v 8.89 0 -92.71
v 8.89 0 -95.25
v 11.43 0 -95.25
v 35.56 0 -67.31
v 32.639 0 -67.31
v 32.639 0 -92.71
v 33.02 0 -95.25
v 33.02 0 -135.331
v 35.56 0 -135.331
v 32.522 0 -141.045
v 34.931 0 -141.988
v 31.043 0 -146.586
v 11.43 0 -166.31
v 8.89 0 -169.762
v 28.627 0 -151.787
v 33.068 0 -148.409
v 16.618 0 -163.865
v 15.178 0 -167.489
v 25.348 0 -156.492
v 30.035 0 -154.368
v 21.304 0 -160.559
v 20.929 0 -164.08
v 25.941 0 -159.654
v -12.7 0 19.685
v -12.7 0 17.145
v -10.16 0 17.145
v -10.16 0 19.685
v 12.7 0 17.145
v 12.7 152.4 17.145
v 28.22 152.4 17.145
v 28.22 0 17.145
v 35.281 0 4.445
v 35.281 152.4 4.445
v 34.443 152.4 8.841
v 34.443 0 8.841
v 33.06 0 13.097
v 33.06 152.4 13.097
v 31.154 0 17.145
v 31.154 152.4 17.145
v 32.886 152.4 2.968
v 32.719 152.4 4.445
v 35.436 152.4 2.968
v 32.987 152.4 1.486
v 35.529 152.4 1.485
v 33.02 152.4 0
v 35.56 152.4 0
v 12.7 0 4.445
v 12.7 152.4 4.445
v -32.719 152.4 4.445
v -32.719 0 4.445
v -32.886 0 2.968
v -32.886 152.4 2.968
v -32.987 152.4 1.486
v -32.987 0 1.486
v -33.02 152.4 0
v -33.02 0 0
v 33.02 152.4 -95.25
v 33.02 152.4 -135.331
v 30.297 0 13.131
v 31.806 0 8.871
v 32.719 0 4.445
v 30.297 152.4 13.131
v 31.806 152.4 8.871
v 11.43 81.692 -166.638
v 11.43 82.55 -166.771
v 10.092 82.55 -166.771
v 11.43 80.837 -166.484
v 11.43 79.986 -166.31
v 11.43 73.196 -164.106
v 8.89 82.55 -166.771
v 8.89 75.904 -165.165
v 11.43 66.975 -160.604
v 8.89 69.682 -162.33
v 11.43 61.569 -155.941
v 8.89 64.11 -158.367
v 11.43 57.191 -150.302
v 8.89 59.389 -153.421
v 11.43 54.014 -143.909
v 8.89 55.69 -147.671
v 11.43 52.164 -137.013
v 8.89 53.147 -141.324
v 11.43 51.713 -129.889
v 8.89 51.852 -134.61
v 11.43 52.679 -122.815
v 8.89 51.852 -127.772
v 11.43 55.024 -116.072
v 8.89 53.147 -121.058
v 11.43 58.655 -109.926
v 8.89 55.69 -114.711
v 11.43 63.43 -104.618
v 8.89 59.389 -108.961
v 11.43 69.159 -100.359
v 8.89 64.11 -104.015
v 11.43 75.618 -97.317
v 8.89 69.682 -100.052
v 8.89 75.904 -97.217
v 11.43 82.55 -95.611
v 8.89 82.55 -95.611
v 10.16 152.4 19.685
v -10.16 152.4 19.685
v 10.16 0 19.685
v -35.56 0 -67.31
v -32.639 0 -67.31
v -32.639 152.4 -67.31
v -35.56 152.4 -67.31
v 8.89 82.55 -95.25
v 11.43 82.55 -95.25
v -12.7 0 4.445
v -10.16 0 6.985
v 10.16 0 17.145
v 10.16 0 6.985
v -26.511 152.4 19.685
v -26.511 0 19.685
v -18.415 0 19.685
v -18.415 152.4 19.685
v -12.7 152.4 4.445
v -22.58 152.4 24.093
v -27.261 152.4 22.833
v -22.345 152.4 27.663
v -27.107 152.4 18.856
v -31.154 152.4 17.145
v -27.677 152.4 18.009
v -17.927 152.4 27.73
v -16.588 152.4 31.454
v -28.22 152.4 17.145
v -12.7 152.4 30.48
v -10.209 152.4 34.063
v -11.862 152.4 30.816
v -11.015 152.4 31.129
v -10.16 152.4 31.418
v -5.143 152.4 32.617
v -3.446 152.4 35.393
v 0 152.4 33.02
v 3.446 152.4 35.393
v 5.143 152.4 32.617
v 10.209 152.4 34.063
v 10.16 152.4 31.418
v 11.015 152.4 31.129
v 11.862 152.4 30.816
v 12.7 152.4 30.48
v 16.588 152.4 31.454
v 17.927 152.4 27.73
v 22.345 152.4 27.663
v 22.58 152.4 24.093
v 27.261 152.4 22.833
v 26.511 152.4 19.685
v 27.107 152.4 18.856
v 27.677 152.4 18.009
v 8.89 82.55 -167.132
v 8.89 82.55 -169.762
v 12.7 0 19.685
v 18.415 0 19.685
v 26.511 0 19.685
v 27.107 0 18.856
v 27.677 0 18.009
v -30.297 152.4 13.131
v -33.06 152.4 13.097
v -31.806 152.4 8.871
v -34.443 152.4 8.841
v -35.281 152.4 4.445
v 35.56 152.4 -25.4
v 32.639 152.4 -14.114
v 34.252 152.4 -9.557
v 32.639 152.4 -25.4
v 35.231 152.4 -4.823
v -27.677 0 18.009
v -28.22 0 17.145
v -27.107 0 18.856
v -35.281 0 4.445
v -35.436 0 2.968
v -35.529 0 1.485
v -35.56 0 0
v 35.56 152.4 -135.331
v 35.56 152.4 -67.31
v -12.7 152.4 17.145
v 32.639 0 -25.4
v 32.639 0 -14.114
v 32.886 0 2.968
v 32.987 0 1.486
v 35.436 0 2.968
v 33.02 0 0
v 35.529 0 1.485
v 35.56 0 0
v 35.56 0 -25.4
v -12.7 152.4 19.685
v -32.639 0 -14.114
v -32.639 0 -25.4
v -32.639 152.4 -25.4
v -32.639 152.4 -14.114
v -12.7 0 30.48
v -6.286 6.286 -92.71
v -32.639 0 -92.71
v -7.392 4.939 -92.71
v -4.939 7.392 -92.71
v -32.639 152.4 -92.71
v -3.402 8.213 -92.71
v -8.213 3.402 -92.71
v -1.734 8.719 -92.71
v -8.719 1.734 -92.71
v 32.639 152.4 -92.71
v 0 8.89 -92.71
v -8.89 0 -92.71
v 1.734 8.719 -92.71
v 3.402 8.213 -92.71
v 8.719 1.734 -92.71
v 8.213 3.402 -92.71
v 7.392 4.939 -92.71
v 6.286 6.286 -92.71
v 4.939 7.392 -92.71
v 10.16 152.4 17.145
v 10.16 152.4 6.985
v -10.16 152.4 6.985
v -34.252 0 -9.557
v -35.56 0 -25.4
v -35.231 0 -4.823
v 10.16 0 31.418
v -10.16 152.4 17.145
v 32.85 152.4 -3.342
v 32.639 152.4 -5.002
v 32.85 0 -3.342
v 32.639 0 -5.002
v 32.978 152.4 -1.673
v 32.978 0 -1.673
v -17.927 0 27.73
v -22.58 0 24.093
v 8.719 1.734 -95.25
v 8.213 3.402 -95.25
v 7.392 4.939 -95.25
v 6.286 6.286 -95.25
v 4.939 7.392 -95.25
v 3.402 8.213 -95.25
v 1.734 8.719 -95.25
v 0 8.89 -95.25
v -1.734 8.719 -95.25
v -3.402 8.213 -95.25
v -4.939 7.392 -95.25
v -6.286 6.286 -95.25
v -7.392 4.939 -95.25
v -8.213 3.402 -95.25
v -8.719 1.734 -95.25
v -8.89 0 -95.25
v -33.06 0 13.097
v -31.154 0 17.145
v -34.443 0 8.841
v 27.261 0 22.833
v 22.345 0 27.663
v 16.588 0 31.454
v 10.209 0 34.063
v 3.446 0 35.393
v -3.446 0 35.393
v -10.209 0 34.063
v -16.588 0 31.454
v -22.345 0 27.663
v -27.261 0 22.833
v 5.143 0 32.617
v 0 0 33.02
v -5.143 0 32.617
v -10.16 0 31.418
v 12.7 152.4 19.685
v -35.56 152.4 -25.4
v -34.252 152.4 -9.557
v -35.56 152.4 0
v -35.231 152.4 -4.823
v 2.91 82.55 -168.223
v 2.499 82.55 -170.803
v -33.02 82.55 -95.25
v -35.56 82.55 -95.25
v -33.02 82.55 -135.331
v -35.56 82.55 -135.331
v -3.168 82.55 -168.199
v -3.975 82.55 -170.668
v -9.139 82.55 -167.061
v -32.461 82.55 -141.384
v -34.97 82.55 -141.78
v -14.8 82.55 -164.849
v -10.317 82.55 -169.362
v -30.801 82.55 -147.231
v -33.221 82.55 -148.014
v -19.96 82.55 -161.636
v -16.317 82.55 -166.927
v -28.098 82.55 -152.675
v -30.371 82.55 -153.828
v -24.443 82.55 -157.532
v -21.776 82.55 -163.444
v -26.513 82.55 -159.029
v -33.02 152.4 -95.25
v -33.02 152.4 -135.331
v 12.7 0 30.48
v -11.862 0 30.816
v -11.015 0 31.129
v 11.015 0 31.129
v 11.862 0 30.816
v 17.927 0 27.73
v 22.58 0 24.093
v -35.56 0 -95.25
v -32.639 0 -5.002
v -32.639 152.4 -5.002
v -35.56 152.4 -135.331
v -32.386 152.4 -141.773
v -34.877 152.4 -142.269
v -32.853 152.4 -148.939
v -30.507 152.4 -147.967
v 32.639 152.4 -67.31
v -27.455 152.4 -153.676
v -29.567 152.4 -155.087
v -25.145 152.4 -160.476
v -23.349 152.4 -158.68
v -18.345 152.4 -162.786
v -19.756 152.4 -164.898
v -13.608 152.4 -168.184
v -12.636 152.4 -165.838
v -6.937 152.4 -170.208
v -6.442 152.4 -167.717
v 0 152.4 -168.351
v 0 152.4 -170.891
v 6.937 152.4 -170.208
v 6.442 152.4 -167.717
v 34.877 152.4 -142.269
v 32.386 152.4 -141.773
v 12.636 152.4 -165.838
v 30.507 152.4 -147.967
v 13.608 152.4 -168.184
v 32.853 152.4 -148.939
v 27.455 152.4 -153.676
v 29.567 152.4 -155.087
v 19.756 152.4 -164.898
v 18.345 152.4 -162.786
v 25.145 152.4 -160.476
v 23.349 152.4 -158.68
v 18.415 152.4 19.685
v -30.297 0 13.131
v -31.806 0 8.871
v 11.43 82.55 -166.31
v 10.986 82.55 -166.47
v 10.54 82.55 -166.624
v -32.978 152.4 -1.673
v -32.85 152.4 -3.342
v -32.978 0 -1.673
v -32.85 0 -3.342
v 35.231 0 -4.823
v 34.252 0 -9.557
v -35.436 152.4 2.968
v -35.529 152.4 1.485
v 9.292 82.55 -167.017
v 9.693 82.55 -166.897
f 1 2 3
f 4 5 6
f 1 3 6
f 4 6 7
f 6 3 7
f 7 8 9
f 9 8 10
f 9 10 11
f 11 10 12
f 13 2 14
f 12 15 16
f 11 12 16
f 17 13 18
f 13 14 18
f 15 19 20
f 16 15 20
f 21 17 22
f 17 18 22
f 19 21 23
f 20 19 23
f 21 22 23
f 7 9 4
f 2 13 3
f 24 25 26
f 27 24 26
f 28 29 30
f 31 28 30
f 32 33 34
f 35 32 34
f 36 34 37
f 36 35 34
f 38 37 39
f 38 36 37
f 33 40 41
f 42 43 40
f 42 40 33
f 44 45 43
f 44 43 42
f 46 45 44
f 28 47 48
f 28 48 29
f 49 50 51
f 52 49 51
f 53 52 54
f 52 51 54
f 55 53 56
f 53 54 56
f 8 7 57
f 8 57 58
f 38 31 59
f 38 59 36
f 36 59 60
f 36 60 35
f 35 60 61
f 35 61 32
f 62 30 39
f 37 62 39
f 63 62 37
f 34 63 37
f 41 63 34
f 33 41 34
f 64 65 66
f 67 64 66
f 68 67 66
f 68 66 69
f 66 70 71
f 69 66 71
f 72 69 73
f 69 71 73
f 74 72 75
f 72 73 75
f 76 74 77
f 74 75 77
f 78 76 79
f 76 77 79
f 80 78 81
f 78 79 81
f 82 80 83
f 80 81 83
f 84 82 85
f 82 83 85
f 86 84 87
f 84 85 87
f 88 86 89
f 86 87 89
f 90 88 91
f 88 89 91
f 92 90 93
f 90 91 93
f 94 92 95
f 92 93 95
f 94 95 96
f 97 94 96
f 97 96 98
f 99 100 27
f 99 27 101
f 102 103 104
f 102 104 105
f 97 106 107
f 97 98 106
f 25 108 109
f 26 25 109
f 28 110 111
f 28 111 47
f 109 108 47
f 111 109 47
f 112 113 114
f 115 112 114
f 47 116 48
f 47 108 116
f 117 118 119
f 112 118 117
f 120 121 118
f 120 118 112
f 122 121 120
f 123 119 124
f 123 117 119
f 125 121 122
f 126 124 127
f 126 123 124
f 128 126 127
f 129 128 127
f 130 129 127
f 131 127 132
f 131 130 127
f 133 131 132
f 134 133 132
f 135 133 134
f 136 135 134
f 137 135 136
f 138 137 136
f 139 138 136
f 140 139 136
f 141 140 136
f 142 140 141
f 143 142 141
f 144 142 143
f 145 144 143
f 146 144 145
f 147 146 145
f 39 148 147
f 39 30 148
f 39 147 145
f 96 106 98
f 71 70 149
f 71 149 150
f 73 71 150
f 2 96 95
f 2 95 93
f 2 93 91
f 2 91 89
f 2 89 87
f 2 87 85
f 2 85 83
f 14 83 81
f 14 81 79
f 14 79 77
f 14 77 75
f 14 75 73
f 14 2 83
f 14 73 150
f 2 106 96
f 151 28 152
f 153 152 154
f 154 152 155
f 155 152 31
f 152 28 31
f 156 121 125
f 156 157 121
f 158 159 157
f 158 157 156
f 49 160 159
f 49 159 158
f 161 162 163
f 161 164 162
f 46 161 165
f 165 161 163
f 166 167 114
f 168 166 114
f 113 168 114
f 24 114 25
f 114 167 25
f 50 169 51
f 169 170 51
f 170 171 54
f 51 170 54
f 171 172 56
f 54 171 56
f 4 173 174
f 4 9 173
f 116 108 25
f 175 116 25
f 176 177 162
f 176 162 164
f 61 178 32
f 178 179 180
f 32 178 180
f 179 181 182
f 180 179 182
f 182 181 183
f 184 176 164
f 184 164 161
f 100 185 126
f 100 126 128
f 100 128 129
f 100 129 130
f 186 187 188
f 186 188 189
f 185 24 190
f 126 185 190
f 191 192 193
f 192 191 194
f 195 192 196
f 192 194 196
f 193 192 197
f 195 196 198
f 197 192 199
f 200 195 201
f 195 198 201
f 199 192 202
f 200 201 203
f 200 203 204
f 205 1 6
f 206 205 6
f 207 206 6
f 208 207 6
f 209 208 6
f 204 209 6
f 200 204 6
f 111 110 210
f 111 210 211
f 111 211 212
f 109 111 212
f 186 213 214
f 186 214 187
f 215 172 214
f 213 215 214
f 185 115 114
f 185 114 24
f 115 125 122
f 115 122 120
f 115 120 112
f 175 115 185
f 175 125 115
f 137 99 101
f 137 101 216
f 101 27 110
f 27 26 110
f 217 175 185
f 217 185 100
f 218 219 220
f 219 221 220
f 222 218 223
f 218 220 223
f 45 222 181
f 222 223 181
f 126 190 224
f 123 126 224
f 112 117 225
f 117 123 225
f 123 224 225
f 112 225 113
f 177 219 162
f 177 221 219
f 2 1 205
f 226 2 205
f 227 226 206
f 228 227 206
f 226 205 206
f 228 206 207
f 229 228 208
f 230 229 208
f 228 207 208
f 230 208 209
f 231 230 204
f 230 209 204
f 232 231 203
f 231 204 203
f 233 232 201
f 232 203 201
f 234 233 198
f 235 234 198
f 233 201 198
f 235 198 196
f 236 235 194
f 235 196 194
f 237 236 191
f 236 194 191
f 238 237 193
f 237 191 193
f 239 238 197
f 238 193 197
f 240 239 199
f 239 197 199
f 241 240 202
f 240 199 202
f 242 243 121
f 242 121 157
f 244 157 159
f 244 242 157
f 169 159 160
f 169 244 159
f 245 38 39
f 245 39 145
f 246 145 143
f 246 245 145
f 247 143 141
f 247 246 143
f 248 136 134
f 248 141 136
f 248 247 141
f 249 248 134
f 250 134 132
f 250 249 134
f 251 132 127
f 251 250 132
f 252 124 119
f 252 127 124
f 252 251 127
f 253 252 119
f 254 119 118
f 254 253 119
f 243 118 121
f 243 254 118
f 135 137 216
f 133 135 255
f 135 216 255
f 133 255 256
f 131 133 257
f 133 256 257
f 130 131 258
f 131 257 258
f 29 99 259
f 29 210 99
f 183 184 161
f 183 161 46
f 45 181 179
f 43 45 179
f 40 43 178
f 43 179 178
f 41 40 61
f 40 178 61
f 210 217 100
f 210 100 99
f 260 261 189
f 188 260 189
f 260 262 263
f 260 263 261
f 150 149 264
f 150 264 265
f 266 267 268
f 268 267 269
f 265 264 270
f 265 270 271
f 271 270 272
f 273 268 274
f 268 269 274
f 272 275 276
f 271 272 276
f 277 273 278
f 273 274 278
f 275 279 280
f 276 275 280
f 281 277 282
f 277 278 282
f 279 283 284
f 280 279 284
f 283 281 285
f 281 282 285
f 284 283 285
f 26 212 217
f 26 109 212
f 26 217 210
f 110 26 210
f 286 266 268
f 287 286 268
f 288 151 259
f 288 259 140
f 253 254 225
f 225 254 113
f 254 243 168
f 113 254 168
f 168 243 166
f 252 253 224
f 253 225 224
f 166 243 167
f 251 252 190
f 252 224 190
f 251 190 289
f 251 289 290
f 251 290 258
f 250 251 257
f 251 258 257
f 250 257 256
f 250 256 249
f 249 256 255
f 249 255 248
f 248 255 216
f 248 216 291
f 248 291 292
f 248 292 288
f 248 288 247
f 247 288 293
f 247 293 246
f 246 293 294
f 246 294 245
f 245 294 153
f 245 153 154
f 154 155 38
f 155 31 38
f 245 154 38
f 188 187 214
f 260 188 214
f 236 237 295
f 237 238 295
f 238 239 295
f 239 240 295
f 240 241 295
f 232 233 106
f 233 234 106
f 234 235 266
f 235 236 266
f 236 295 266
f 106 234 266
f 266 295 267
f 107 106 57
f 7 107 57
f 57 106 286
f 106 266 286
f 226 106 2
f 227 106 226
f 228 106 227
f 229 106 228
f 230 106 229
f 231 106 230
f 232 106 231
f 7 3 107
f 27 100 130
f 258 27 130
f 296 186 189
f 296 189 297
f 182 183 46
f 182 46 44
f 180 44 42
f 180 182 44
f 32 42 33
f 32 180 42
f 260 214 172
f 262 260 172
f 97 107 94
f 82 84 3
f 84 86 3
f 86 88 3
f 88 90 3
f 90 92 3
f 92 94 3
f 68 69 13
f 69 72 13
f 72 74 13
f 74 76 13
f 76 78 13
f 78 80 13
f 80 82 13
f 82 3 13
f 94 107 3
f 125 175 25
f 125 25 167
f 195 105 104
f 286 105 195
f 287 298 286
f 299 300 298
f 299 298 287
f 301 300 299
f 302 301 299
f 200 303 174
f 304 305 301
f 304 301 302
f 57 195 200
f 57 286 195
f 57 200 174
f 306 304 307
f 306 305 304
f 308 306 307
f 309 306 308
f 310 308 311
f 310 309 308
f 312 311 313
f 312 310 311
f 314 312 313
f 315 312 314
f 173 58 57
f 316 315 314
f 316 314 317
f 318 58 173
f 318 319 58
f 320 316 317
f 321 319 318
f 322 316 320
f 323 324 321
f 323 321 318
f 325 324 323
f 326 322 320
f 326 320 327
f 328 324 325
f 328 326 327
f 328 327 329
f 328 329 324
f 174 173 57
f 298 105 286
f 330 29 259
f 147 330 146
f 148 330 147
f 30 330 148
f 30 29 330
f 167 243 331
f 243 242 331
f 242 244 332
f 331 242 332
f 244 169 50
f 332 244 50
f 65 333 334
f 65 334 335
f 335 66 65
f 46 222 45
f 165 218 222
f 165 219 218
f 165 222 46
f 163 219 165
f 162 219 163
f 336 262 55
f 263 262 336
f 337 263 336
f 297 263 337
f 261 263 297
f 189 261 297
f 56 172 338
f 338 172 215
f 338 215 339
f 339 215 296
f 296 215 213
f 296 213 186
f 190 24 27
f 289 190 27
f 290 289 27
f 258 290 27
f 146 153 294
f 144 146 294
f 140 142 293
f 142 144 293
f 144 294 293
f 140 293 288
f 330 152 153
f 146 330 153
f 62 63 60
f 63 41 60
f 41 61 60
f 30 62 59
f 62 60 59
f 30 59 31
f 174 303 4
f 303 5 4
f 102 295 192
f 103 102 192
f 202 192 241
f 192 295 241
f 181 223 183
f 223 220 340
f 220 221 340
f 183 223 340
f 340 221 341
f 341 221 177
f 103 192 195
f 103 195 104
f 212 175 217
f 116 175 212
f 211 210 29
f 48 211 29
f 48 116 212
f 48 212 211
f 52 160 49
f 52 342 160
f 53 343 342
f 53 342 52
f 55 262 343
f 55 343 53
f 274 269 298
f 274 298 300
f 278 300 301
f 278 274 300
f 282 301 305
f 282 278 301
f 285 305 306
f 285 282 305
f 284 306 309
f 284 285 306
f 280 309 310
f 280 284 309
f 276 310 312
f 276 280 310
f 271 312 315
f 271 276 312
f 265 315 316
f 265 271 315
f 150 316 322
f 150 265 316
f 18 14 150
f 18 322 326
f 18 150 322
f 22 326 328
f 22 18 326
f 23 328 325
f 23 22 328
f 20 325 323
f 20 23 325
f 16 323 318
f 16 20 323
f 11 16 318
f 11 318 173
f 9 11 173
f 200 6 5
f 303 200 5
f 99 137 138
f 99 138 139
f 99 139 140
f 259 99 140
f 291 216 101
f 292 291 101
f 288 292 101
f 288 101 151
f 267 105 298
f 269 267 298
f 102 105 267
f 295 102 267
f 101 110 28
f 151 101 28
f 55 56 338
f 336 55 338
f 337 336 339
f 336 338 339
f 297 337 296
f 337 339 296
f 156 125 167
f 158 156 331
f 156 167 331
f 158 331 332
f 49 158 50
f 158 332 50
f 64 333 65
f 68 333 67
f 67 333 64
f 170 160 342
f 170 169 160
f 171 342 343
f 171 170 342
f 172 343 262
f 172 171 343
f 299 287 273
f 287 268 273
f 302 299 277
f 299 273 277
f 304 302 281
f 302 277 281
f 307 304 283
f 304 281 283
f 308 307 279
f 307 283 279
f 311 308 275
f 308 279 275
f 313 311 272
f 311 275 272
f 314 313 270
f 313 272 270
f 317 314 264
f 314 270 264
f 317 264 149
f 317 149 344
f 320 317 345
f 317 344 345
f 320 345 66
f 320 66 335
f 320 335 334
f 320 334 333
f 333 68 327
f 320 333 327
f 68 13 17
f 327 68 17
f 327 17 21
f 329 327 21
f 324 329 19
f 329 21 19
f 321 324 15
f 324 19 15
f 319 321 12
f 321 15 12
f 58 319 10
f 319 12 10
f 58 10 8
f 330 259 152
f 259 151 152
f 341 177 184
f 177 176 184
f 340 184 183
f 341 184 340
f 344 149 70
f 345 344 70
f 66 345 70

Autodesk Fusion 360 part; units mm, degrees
sketch "Front" plane through (0, 0, 0) normal (0, 1, 0) x (1, 0, 0)
  circle A0 centre (0, 0) radius 35.56
  line L0 (-123.0104, 0) -> (123.0104, 0) construction
  line L1 (-35.2811, -4.445) -> (35.2811, -4.445)
  line L2 (0, -192.2069) -> (0, 192.2069) construction
  line L3 (-32.639, -3.175) -> (32.639, -3.175)
  line L4 (32.639, -3.175) -> (32.639, 91.44)
  line L5 (32.639, 91.44) -> (-32.639, 91.44)
  line L6 (-32.639, 91.44) -> (-32.639, -3.175)
  line L7 (-32.639, 91.44) -> (32.639, -3.175) construction
  line L8 (-32.639, -3.175) -> (32.639, 91.44) construction
  line L9 (12.7, -4.445) -> (12.7, -17.145)
  circle A1 centre (0, 135.3312) radius 35.56
  line L10 (-118.5711, 135.3312) -> (118.5711, 135.3312) construction
  line L11 (-121.8331, -35.56) -> (121.8331, -35.56) construction
  line L12 (-118.3233, 170.8912) -> (118.3233, 170.8912) construction
  line L13 (-35.56, 92.71) -> (35.56, 92.71)
  line L14 (-35.56, 135.3312) -> (-35.56, 92.71)
  line L15 (35.56, 135.3312) -> (35.56, 92.71)
  line L16 (12.7, -17.145) -> (31.1539, -17.145)
  line L17 (-12.7, -4.445) -> (-12.7, -17.145)
  line L18 (-12.7, -17.145) -> (-31.1539, -17.145)
  line L19 (-35.56, 92.71) -> (-32.639, 92.71)
  line L20 (-32.639, 92.71) -> (-32.639, 67.31)
  line L21 (-32.639, 67.31) -> (-35.56, 67.31)
  line L22 (-35.56, 67.31) -> (-35.56, 92.71)
  line L23 (35.56, 92.71) -> (32.639, 92.71)
  line L24 (32.639, 92.71) -> (32.639, 67.31)
  line L25 (32.639, 67.31) -> (35.56, 67.31)
  line L26 (35.56, 67.31) -> (35.56, 92.71)
  line L27 (-35.56, 95.25) -> (35.56, 95.25)
  circle A2 centre (0, 0) radius 33.02
  circle A3 centre (0, 135.3312) radius 33.02
  line L28 (-26.5108, -19.685) -> (-18.415, -19.685)
  line L29 (18.415, -19.685) -> (26.5108, -19.685)
  line L30 (10.16, -17.145) -> (10.16, -6.985)
  line L31 (10.16, -6.985) -> (-10.16, -6.985)
  line L32 (-10.16, -6.985) -> (-10.16, -17.145)
  line L33 (-18.415, -19.685) -> (18.415, -19.685)
  line L34 (-12.7, -17.145) -> (12.7, -17.145)
  line L35 (-33.02, 95.25) -> (-33.02, 135.3312)
  line L36 (33.02, 95.25) -> (33.02, 135.3312)
  line L37 (8.89, 95.25) -> (8.89, 169.762)
  line L38 (11.43, 95.25) -> (11.43, 169.0042)
  line L39 (-12.7, -17.145) -> (-12.7, -30.48)
  line L40 (-10.16, -17.145) -> (-10.16, -31.4181)
  line L41 (10.16, -17.145) -> (10.16, -31.4181)
  line L42 (12.7, -17.145) -> (12.7, -30.48)
  line L43 (-35.56, 0) -> (-32.639, 0)
  line L44 (-32.639, 0) -> (-32.639, 25.4)
  line L45 (-32.639, 25.4) -> (-35.56, 25.4)
  line L46 (-35.56, 25.4) -> (-35.56, 0)
  line L47 (35.56, 0) -> (32.639, 0)
  line L48 (32.639, 0) -> (32.639, 25.4)
  line L49 (32.639, 25.4) -> (35.56, 25.4)
  line L50 (35.56, 25.4) -> (35.56, 0)
  point P0 (0, 44.1325)
  point P1 (0, -35.56)
  point P2 (0, -12.7)
  point P3 (0, 170.8912)
  point P4 (0, 148.0312)
  dimension "d1" = 71.12
  dimension "d4" = 65.278
  dimension "d5" = 94.615
  dimension "d14" = 71.12
  dimension "d15" = 135.3312
  dimension "d17" = 1.27
  dimension "d23" = 1.27
  dimension "d31" = 31.115
  dimension "d32" = 206.4512
  dimension "d33" = 78.1812
  dimension "d34" = 12.7
  dimension "d35" = 12.7
  dimension "d39" = 12.7
  dimension "d40" = 12.7
  dimension "d45" = 25.4
  dimension "d46" = 25.4
  dimension "d51" = 2.54
  dimension "d56" = 66.04
  dimension "d58" = 66.04
  dimension "d59" = 2.54
  dimension "d60" = 2.54
  dimension "d63" = 2.54
  dimension "d64" = 2.54
  dimension "d66" = 2.54
  dimension "d74" = 2.54
  dimension "d75" = 2.54
  dimension "d79" = 2.54
  dimension "d80" = 44.45
  dimension "d90" = 44.45
  dimension "d92" = 40.0812
  dimension "d102" = 25.4
  dimension "d103" = 25.4
extrude "Extrude1" add sketch "Front" along normal blind 152.4 contours A0 L1 A2 L43 | A0 L6 L44 L45 L46 | A0 L6 A2 L43 L44 | A0 L1 L18 A2 | A0 L16 L18 A2 | A0 L4 L48 L49 L50 | A0 L4 A2 L47 L48 | A0 L1 L16 A2 | L18 A2 L28 L33 L39 | L1 L9 L17 L30 L31 L32 L34 | A0 L1 A2 L47 | L16 A2 L29 L33 L42 | L33 L34 L39 L40 | L33 L34 L41 L42 | L33 L34 L40 L41 | A2 L33 L39 L40 | A2 L33 L41 L42 makes body 1
extrude "Extrude9" add sketch "Front" along normal blind 152.4 separate body contours L6 L13 L19 L20 L21 L22 | L4 L13 L23 L24 L25 L26 | L13 L14 L15 L19 L23 L27 | A1 L14 L27 L35 | A1 L15 L27 L36 | A1 A3 L35 L37 | A1 A3 L36 L38 | A1 A3 L37 L38 picked at (5.7285, 169.4993) picked at (12.9397, 167.4743) picked at (9.4589, 167.8477) makes body 2
extrude "Extrude10" add sketch "Front" along normal blind 82.55 contours A1 A3 L37 L38 | A1 L27 L37 L38 | A3 L37 L38 | A1 A3 L37 L38 bodies 2
sketch "Motor Cut-out" plane through (-35.56, 0, 0) normal (-1, 0, 0) x (0, -1, 0)
  line L0 (0, -135.3312) -> (0, -67.31)
  line L1 (0, -67.31) -> (-152.4, -67.31)
  line L2 (-152.4, -67.31) -> (-152.4, -135.3312)
  line L3 (-152.4, -135.3312) -> (0, -135.3312)
  line L4 (0, -95.25) -> (-82.55, -95.25)
  line L5 (-82.55, -95.25) -> (-82.55, -172.55)
  line L6 (-82.55, -172.55) -> (0, -172.55)
  line L7 (0, -172.55) -> (0, -95.25)
  dimension "d86" = 82.55
  dimension "d91" = 40.0812
extrude "Extrude11" cut sketch "Motor Cut-out" against normal blind 44.45 contours L0 L3 L4 L5 L7 | L3 L5 L6 L7 bodies 2
sketch "3d-Print Arch" plane through (8.89, 0, 0) normal (-1, 0, 0) x (0, -1, 0)
  line L0 (0, -169.762) -> (0, -95.25)
  line L1 (0, -95.25) -> (-82.55, -95.25)
  line L2 (-82.55, -95.25) -> (-82.55, -167.132)
  line L3 (-82.55, -167.132) -> (-82.55, -169.762)
  line L4 (-82.55, -169.762) -> (0, -169.762)
  line L5 (-82.55, -95.25) -> (-82.55, -167.132) construction
  line L6 (-104.9543, -131.191) -> (-60.1457, -131.191) construction
  circle A0 centre (-87.63, -131.191) radius 35.941
  point P0 (-82.55, -131.191)
  dimension "d98" = 71.882
  dimension "d100" = 71.882
  dimension "d101" = 5.08
extrude "Extrude12" cut sketch "3d-Print Arch" against normal blind 2.54 contours L2 A0 picked at (-66.6022, -131.7672) bodies 2
sketch "Sketch8" plane through (0, 0, -92.71) normal (0, 0, 1) x (-1, 0, 0)
  line L0 (32.639, 0) -> (-32.639, 0)
  line L1 (-32.639, 0) -> (-32.639, -152.4)
  line L2 (-32.639, -152.4) -> (32.639, -152.4)
  line L3 (32.639, -152.4) -> (32.639, 0)
  circle A0 centre (0, 0) radius 8.89
  dimension "d104" = 17.78
extrude "Extrude13" cut sketch "Sketch8" against normal blind 12.7 contours L0 A0 picked at (-0.6008, -4.8695) bodies 2
equation "d1 = ( ( 1.5 * 2 ) * 1 in ) - ( ( 0.1 * 2 ) * 1 in )"
equation "d6 = ( ( 2.80 - 1 ) / 2 ) * 1 in"
equation "d10 = ( d1 - d4 - 0.1 in ) / 2"
equation "d14 = d1"
equation "d17 = d23"
equation "d33 = 2.75 in + 0.328 in"
equation "d35 = d34"
equation "d46 = d45"
equation "d56 = d1 - ( ( 0.1 * 2 ) * 1 in )"
equation "d58 = d1 - ( ( 0.1 * 2 ) * 1 in )"
equation "d83 = 6 in - 2.75 in"
equation "d86 = 6 in - 2.75 in"
equation "d97 = ( ( 2.9335441712 / 2 ) * 1 in ) - 0.1 in"
equation "d102 = d45"
equation "d103 = d45"
